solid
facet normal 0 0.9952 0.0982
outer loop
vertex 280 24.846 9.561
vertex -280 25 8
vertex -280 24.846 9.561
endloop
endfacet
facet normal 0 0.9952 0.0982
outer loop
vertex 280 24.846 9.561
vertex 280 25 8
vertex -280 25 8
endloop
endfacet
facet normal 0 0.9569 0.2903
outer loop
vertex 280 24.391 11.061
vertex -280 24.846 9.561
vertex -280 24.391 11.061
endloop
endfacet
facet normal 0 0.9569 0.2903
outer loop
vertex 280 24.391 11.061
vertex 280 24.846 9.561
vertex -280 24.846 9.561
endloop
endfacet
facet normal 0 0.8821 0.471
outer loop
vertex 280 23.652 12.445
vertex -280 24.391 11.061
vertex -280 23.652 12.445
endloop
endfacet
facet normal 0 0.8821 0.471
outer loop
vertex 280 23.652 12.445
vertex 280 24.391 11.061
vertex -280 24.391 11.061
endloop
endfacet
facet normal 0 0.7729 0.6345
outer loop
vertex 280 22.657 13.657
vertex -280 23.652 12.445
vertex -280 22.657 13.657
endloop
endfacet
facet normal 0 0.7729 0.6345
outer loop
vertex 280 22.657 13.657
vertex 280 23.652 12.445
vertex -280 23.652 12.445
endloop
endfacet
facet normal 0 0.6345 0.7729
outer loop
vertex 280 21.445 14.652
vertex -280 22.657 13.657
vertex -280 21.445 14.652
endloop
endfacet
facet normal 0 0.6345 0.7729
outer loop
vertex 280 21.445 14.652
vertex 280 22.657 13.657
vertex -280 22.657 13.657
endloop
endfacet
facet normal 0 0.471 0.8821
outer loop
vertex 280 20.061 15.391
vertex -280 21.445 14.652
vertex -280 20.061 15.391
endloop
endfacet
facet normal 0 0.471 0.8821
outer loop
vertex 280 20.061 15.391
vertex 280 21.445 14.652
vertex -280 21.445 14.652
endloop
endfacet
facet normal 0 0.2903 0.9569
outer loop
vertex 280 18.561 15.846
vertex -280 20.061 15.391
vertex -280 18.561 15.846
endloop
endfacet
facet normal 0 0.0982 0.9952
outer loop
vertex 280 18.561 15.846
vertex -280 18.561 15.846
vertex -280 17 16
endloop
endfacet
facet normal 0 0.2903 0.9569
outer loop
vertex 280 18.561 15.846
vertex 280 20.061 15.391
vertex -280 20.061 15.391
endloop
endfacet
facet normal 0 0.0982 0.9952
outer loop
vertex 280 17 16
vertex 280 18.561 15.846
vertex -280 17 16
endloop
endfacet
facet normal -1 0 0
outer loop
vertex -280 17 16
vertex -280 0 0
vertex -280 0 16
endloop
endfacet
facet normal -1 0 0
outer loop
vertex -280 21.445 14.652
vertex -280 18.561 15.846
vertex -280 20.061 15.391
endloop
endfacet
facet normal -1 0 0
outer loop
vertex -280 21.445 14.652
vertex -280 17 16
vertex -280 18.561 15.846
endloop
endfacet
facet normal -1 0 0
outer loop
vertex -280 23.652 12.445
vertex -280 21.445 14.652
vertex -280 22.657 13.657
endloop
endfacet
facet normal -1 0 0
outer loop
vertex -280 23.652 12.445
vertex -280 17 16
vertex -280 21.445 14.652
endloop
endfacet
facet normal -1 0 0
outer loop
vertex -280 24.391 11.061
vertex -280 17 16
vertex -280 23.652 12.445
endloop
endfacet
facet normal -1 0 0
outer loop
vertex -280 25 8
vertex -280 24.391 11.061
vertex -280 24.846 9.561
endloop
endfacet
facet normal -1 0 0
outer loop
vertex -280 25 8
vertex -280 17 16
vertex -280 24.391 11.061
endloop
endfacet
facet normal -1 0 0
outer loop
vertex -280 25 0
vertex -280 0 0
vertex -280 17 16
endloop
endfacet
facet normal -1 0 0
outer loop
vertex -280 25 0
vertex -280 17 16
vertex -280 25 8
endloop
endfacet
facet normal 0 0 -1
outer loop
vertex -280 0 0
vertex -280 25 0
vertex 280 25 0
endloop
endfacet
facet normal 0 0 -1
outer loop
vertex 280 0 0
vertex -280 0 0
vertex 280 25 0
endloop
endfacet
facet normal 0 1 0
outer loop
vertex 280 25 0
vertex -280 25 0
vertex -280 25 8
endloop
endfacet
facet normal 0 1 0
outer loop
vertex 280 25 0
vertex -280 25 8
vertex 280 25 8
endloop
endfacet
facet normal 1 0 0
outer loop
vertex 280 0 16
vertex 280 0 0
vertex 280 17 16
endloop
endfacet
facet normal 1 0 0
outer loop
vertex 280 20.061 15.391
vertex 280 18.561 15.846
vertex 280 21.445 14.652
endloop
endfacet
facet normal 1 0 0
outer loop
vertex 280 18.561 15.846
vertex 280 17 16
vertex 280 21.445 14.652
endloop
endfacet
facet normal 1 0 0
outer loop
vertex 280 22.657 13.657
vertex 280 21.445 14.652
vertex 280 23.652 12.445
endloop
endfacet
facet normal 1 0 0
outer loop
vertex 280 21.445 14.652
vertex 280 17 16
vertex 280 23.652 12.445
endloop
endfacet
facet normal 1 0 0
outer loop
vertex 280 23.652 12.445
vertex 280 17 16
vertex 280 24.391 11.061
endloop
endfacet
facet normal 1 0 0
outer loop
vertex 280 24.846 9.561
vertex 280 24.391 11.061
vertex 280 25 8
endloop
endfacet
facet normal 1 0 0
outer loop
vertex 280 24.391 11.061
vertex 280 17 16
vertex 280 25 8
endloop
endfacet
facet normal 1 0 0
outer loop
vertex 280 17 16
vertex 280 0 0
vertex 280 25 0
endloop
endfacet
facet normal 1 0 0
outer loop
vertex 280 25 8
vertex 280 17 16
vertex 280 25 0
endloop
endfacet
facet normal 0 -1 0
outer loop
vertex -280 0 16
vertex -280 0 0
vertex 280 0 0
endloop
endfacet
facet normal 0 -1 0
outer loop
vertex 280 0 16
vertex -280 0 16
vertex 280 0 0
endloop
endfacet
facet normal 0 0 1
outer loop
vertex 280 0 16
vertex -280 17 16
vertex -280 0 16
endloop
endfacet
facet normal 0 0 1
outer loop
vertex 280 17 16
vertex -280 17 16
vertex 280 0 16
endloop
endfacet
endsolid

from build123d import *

# Parameters (mm, degrees)
SKETCH1_W           = 560
SKETCH1_H           = 25
BOSS_EXTRUDE1_DEPTH = 16
FILLET1_R           = 8


with BuildPart() as part:
    # Sketch1 → Boss-Extrude1 (new body)
    with BuildSketch(Plane.XY):
        with Locations((0, 12.5)):
            Rectangle(SKETCH1_W, SKETCH1_H)
    extrude(amount=BOSS_EXTRUDE1_DEPTH)

    # Fillet1
    fillet1_edges = [part.edges().sort_by_distance(p)[0] for p in [
        (0, 25, 16),
    ]]
    fillet(fillet1_edges, radius=FILLET1_R)


solid = part.part
